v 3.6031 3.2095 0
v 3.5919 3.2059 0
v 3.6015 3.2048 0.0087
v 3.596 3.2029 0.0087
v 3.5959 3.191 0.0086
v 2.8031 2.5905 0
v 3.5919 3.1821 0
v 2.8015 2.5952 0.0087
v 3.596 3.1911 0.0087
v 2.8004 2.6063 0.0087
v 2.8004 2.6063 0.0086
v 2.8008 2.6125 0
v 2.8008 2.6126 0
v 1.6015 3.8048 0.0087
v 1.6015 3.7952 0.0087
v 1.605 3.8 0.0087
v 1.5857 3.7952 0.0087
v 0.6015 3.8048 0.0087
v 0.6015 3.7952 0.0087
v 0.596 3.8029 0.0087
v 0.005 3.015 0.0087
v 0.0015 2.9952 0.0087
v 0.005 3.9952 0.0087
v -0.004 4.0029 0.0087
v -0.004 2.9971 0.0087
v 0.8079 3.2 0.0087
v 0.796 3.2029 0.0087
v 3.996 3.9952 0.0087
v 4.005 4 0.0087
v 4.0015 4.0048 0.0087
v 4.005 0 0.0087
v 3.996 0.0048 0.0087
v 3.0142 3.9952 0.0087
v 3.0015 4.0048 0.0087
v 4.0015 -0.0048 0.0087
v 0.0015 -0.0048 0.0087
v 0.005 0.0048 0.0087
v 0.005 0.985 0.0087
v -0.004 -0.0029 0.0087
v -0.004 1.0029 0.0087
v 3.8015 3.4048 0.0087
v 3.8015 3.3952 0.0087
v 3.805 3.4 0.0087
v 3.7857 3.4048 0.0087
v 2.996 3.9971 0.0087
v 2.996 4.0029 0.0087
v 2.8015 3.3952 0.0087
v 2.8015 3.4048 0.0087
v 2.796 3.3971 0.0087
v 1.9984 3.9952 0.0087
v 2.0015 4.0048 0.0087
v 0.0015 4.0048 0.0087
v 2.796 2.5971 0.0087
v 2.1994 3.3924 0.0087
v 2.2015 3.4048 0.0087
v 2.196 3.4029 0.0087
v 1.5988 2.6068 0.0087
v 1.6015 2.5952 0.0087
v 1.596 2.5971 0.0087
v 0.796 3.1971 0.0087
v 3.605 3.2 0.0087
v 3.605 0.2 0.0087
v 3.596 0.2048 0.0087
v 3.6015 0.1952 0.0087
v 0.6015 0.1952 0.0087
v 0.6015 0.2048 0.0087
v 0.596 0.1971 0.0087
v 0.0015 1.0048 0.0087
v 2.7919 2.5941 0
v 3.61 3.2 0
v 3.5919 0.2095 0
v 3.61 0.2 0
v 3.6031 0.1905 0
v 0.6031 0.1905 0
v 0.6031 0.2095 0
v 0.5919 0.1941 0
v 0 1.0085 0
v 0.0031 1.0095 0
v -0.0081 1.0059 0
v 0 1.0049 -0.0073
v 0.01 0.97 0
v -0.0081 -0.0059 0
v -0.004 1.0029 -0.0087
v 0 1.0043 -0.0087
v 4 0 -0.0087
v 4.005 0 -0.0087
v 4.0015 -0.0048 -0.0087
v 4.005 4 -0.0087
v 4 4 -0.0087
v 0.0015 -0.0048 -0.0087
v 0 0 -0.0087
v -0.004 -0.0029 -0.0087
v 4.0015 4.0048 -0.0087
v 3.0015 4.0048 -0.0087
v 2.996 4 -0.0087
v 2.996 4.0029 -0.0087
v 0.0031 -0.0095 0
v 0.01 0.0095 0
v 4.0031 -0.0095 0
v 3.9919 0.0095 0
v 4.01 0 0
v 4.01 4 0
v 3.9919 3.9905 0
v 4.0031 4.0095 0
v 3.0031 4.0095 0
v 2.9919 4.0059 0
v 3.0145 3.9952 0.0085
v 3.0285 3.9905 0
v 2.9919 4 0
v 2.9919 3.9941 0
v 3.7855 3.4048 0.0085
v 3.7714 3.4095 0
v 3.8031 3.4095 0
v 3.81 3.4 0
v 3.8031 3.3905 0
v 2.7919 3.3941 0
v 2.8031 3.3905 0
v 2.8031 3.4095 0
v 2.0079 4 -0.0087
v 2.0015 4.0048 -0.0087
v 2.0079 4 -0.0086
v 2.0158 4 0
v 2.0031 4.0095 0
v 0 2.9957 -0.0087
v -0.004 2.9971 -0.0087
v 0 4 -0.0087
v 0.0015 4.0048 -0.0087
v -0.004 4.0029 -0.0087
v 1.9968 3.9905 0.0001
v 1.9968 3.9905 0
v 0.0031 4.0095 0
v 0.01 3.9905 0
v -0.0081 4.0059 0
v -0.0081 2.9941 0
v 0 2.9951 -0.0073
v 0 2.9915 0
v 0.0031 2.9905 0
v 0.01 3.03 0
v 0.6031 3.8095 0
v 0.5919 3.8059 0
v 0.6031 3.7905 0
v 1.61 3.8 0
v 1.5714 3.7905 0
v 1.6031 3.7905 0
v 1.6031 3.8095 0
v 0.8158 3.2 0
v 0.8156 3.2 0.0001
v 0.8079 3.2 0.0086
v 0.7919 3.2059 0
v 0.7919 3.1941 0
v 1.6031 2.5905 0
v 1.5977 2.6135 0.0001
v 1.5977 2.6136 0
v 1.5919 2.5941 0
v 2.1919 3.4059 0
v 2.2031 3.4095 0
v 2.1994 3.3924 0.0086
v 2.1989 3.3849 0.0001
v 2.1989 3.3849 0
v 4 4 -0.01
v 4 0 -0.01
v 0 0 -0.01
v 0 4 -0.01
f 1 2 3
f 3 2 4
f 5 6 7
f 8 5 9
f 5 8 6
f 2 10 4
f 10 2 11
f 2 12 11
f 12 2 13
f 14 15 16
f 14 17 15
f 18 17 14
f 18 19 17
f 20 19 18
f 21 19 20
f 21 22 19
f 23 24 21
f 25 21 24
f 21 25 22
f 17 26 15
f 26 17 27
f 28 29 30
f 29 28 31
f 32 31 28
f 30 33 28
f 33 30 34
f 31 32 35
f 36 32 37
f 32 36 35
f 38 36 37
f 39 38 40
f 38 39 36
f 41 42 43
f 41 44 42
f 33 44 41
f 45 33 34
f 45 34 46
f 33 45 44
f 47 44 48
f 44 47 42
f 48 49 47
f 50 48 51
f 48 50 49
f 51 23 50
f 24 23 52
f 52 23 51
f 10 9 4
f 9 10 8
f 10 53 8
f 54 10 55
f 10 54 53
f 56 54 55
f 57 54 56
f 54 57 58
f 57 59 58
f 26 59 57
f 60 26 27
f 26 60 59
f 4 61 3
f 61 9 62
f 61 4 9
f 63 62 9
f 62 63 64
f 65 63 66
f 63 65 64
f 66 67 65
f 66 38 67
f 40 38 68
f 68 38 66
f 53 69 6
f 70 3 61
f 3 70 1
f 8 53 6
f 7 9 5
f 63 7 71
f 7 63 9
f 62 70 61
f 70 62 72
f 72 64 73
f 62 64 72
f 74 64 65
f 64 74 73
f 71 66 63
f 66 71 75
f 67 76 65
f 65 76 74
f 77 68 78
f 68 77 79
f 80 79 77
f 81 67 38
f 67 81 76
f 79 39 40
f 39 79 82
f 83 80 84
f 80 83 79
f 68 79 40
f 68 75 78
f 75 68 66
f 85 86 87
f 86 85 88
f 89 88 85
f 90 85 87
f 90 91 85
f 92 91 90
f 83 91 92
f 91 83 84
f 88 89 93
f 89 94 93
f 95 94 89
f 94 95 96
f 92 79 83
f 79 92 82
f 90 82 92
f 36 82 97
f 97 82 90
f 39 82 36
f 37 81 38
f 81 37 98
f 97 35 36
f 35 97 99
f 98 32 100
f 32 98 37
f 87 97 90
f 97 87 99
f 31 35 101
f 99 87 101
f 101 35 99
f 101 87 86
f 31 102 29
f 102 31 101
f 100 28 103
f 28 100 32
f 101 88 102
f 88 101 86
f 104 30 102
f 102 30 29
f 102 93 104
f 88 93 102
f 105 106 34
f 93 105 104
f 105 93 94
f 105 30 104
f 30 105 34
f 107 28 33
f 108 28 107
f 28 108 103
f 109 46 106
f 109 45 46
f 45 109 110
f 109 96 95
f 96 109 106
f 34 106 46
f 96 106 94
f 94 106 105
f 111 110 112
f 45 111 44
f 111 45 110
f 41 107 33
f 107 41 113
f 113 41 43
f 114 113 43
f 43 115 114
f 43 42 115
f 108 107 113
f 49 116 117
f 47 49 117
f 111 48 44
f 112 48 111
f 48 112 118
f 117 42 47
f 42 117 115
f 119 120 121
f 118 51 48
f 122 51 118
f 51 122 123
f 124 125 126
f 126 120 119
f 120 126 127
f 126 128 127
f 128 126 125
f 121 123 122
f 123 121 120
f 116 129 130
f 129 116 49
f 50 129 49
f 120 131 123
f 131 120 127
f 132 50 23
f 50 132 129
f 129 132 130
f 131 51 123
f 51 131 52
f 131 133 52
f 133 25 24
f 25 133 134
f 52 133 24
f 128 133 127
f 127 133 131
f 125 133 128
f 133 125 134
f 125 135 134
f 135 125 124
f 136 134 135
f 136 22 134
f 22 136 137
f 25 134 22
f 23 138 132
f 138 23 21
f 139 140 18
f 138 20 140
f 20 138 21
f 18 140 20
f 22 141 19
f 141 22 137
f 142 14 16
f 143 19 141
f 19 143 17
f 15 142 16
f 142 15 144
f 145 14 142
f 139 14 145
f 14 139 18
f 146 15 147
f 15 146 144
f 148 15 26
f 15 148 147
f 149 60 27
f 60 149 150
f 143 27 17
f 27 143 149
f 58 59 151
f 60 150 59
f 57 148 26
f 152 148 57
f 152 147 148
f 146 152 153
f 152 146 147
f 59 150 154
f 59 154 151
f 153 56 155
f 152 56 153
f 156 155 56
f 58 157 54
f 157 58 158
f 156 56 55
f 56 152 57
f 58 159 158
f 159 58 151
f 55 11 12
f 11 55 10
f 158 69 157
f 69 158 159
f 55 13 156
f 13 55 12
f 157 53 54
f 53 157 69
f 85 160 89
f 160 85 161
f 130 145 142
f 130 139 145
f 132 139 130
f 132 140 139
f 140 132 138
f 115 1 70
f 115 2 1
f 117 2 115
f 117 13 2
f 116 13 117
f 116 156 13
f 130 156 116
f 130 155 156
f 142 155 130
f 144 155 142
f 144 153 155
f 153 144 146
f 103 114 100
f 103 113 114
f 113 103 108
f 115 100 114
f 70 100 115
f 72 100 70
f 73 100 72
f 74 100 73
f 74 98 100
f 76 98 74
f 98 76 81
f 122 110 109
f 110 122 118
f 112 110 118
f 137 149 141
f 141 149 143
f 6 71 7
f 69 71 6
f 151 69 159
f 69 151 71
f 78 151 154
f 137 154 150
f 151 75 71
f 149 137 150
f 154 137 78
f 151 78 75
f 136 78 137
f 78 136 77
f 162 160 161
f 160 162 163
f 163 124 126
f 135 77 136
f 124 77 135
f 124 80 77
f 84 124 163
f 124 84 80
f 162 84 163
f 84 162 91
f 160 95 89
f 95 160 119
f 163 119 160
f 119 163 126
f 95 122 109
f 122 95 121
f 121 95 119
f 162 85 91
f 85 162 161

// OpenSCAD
hull(){
    translate([2.8, 2.6]) sphere(0.01);
    translate([3.6, 3.2]) sphere(0.01);
}
hull(){
    translate([3.6, 3.2]) sphere(0.01);
    translate([3.6, 2.2]) sphere(0.01);
}
hull(){
    translate([3.6, 2.2]) sphere(0.01);
    translate([3.6, 1.2]) sphere(0.01);
}
hull(){
    translate([3.6, 1.2]) sphere(0.01);
    translate([3.6, 0.2]) sphere(0.01);
}
hull(){
    translate([3.6, 0.2]) sphere(0.01);
    translate([2.6, 0.2]) sphere(0.01);
}
hull(){
    translate([2.6, 0.2]) sphere(0.01);
    translate([1.6, 0.2]) sphere(0.01);
}
hull(){
    translate([1.6, 0.2]) sphere(0.01);
    translate([0.6, 0.2]) sphere(0.01);
}
hull(){
    translate([0.6, 0.2]) sphere(0.01);
    translate([0.0, 1.0]) sphere(0.01);
}
hull(){
    translate([0.0, 1.0]) sphere(0.01);
    translate([0.0, 0.0]) sphere(0.01);
}
hull(){
    translate([0.0, 0.0]) sphere(0.01);
    translate([1.0, 0.0]) sphere(0.01);
}
hull(){
    translate([1.0, 0.0]) sphere(0.01);
    translate([2.0, 0.0]) sphere(0.01);
}
hull(){
    translate([2.0, 0.0]) sphere(0.01);
    translate([3.0, 0.0]) sphere(0.01);
}
hull(){
    translate([3.0, 0.0]) sphere(0.01);
    translate([4.0, 0.0]) sphere(0.01);
}
hull(){
    translate([4.0, 0.0]) sphere(0.01);
    translate([4.0, 1.0]) sphere(0.01);
}
hull(){
    translate([4.0, 1.0]) sphere(0.01);
    translate([4.0, 2.0]) sphere(0.01);
}
hull(){
    translate([4.0, 2.0]) sphere(0.01);
    translate([4.0, 3.0]) sphere(0.01);
}
hull(){
    translate([4.0, 3.0]) sphere(0.01);
    translate([4.0, 4.0]) sphere(0.01);
}
hull(){
    translate([4.0, 4.0]) sphere(0.01);
    translate([3.0, 4.0]) sphere(0.01);
}
hull(){
    translate([3.0, 4.0]) sphere(0.01);
    translate([3.8, 3.4]) sphere(0.01);
}
hull(){
    translate([3.8, 3.4]) sphere(0.01);
    translate([2.8, 3.4]) sphere(0.01);
}
hull(){
    translate([2.8, 3.4]) sphere(0.01);
    translate([2.0, 4.0]) sphere(0.01);
}
hull(){
    translate([2.0, 4.0]) sphere(0.01);
    translate([1.0, 4.0]) sphere(0.01);
}
hull(){
    translate([1.0, 4.0]) sphere(0.01);
    translate([0.0, 4.0]) sphere(0.01);
}
hull(){
    translate([0.0, 4.0]) sphere(0.01);
    translate([0.0, 3.0]) sphere(0.01);
}
hull(){
    translate([0.0, 3.0]) sphere(0.01);
    translate([0.6, 3.8]) sphere(0.01);
}
hull(){
    translate([0.6, 3.8]) sphere(0.01);
    translate([1.6, 3.8]) sphere(0.01);
}
hull(){
    translate([1.6, 3.8]) sphere(0.01);
    translate([0.8, 3.2]) sphere(0.01);
}
hull(){
    translate([0.8, 3.2]) sphere(0.01);
    translate([1.6, 2.6]) sphere(0.01);
}
hull(){
    translate([1.6, 2.6]) sphere(0.01);
    translate([2.2, 3.4]) sphere(0.01);
}
hull(){
    translate([2.2, 3.4]) sphere(0.01);
    translate([2.8, 2.6]) sphere(0.01);
}
translate([0,0,-0.01]) color([0.1,0.1,0.1]) cube([4,4,0.01]);
